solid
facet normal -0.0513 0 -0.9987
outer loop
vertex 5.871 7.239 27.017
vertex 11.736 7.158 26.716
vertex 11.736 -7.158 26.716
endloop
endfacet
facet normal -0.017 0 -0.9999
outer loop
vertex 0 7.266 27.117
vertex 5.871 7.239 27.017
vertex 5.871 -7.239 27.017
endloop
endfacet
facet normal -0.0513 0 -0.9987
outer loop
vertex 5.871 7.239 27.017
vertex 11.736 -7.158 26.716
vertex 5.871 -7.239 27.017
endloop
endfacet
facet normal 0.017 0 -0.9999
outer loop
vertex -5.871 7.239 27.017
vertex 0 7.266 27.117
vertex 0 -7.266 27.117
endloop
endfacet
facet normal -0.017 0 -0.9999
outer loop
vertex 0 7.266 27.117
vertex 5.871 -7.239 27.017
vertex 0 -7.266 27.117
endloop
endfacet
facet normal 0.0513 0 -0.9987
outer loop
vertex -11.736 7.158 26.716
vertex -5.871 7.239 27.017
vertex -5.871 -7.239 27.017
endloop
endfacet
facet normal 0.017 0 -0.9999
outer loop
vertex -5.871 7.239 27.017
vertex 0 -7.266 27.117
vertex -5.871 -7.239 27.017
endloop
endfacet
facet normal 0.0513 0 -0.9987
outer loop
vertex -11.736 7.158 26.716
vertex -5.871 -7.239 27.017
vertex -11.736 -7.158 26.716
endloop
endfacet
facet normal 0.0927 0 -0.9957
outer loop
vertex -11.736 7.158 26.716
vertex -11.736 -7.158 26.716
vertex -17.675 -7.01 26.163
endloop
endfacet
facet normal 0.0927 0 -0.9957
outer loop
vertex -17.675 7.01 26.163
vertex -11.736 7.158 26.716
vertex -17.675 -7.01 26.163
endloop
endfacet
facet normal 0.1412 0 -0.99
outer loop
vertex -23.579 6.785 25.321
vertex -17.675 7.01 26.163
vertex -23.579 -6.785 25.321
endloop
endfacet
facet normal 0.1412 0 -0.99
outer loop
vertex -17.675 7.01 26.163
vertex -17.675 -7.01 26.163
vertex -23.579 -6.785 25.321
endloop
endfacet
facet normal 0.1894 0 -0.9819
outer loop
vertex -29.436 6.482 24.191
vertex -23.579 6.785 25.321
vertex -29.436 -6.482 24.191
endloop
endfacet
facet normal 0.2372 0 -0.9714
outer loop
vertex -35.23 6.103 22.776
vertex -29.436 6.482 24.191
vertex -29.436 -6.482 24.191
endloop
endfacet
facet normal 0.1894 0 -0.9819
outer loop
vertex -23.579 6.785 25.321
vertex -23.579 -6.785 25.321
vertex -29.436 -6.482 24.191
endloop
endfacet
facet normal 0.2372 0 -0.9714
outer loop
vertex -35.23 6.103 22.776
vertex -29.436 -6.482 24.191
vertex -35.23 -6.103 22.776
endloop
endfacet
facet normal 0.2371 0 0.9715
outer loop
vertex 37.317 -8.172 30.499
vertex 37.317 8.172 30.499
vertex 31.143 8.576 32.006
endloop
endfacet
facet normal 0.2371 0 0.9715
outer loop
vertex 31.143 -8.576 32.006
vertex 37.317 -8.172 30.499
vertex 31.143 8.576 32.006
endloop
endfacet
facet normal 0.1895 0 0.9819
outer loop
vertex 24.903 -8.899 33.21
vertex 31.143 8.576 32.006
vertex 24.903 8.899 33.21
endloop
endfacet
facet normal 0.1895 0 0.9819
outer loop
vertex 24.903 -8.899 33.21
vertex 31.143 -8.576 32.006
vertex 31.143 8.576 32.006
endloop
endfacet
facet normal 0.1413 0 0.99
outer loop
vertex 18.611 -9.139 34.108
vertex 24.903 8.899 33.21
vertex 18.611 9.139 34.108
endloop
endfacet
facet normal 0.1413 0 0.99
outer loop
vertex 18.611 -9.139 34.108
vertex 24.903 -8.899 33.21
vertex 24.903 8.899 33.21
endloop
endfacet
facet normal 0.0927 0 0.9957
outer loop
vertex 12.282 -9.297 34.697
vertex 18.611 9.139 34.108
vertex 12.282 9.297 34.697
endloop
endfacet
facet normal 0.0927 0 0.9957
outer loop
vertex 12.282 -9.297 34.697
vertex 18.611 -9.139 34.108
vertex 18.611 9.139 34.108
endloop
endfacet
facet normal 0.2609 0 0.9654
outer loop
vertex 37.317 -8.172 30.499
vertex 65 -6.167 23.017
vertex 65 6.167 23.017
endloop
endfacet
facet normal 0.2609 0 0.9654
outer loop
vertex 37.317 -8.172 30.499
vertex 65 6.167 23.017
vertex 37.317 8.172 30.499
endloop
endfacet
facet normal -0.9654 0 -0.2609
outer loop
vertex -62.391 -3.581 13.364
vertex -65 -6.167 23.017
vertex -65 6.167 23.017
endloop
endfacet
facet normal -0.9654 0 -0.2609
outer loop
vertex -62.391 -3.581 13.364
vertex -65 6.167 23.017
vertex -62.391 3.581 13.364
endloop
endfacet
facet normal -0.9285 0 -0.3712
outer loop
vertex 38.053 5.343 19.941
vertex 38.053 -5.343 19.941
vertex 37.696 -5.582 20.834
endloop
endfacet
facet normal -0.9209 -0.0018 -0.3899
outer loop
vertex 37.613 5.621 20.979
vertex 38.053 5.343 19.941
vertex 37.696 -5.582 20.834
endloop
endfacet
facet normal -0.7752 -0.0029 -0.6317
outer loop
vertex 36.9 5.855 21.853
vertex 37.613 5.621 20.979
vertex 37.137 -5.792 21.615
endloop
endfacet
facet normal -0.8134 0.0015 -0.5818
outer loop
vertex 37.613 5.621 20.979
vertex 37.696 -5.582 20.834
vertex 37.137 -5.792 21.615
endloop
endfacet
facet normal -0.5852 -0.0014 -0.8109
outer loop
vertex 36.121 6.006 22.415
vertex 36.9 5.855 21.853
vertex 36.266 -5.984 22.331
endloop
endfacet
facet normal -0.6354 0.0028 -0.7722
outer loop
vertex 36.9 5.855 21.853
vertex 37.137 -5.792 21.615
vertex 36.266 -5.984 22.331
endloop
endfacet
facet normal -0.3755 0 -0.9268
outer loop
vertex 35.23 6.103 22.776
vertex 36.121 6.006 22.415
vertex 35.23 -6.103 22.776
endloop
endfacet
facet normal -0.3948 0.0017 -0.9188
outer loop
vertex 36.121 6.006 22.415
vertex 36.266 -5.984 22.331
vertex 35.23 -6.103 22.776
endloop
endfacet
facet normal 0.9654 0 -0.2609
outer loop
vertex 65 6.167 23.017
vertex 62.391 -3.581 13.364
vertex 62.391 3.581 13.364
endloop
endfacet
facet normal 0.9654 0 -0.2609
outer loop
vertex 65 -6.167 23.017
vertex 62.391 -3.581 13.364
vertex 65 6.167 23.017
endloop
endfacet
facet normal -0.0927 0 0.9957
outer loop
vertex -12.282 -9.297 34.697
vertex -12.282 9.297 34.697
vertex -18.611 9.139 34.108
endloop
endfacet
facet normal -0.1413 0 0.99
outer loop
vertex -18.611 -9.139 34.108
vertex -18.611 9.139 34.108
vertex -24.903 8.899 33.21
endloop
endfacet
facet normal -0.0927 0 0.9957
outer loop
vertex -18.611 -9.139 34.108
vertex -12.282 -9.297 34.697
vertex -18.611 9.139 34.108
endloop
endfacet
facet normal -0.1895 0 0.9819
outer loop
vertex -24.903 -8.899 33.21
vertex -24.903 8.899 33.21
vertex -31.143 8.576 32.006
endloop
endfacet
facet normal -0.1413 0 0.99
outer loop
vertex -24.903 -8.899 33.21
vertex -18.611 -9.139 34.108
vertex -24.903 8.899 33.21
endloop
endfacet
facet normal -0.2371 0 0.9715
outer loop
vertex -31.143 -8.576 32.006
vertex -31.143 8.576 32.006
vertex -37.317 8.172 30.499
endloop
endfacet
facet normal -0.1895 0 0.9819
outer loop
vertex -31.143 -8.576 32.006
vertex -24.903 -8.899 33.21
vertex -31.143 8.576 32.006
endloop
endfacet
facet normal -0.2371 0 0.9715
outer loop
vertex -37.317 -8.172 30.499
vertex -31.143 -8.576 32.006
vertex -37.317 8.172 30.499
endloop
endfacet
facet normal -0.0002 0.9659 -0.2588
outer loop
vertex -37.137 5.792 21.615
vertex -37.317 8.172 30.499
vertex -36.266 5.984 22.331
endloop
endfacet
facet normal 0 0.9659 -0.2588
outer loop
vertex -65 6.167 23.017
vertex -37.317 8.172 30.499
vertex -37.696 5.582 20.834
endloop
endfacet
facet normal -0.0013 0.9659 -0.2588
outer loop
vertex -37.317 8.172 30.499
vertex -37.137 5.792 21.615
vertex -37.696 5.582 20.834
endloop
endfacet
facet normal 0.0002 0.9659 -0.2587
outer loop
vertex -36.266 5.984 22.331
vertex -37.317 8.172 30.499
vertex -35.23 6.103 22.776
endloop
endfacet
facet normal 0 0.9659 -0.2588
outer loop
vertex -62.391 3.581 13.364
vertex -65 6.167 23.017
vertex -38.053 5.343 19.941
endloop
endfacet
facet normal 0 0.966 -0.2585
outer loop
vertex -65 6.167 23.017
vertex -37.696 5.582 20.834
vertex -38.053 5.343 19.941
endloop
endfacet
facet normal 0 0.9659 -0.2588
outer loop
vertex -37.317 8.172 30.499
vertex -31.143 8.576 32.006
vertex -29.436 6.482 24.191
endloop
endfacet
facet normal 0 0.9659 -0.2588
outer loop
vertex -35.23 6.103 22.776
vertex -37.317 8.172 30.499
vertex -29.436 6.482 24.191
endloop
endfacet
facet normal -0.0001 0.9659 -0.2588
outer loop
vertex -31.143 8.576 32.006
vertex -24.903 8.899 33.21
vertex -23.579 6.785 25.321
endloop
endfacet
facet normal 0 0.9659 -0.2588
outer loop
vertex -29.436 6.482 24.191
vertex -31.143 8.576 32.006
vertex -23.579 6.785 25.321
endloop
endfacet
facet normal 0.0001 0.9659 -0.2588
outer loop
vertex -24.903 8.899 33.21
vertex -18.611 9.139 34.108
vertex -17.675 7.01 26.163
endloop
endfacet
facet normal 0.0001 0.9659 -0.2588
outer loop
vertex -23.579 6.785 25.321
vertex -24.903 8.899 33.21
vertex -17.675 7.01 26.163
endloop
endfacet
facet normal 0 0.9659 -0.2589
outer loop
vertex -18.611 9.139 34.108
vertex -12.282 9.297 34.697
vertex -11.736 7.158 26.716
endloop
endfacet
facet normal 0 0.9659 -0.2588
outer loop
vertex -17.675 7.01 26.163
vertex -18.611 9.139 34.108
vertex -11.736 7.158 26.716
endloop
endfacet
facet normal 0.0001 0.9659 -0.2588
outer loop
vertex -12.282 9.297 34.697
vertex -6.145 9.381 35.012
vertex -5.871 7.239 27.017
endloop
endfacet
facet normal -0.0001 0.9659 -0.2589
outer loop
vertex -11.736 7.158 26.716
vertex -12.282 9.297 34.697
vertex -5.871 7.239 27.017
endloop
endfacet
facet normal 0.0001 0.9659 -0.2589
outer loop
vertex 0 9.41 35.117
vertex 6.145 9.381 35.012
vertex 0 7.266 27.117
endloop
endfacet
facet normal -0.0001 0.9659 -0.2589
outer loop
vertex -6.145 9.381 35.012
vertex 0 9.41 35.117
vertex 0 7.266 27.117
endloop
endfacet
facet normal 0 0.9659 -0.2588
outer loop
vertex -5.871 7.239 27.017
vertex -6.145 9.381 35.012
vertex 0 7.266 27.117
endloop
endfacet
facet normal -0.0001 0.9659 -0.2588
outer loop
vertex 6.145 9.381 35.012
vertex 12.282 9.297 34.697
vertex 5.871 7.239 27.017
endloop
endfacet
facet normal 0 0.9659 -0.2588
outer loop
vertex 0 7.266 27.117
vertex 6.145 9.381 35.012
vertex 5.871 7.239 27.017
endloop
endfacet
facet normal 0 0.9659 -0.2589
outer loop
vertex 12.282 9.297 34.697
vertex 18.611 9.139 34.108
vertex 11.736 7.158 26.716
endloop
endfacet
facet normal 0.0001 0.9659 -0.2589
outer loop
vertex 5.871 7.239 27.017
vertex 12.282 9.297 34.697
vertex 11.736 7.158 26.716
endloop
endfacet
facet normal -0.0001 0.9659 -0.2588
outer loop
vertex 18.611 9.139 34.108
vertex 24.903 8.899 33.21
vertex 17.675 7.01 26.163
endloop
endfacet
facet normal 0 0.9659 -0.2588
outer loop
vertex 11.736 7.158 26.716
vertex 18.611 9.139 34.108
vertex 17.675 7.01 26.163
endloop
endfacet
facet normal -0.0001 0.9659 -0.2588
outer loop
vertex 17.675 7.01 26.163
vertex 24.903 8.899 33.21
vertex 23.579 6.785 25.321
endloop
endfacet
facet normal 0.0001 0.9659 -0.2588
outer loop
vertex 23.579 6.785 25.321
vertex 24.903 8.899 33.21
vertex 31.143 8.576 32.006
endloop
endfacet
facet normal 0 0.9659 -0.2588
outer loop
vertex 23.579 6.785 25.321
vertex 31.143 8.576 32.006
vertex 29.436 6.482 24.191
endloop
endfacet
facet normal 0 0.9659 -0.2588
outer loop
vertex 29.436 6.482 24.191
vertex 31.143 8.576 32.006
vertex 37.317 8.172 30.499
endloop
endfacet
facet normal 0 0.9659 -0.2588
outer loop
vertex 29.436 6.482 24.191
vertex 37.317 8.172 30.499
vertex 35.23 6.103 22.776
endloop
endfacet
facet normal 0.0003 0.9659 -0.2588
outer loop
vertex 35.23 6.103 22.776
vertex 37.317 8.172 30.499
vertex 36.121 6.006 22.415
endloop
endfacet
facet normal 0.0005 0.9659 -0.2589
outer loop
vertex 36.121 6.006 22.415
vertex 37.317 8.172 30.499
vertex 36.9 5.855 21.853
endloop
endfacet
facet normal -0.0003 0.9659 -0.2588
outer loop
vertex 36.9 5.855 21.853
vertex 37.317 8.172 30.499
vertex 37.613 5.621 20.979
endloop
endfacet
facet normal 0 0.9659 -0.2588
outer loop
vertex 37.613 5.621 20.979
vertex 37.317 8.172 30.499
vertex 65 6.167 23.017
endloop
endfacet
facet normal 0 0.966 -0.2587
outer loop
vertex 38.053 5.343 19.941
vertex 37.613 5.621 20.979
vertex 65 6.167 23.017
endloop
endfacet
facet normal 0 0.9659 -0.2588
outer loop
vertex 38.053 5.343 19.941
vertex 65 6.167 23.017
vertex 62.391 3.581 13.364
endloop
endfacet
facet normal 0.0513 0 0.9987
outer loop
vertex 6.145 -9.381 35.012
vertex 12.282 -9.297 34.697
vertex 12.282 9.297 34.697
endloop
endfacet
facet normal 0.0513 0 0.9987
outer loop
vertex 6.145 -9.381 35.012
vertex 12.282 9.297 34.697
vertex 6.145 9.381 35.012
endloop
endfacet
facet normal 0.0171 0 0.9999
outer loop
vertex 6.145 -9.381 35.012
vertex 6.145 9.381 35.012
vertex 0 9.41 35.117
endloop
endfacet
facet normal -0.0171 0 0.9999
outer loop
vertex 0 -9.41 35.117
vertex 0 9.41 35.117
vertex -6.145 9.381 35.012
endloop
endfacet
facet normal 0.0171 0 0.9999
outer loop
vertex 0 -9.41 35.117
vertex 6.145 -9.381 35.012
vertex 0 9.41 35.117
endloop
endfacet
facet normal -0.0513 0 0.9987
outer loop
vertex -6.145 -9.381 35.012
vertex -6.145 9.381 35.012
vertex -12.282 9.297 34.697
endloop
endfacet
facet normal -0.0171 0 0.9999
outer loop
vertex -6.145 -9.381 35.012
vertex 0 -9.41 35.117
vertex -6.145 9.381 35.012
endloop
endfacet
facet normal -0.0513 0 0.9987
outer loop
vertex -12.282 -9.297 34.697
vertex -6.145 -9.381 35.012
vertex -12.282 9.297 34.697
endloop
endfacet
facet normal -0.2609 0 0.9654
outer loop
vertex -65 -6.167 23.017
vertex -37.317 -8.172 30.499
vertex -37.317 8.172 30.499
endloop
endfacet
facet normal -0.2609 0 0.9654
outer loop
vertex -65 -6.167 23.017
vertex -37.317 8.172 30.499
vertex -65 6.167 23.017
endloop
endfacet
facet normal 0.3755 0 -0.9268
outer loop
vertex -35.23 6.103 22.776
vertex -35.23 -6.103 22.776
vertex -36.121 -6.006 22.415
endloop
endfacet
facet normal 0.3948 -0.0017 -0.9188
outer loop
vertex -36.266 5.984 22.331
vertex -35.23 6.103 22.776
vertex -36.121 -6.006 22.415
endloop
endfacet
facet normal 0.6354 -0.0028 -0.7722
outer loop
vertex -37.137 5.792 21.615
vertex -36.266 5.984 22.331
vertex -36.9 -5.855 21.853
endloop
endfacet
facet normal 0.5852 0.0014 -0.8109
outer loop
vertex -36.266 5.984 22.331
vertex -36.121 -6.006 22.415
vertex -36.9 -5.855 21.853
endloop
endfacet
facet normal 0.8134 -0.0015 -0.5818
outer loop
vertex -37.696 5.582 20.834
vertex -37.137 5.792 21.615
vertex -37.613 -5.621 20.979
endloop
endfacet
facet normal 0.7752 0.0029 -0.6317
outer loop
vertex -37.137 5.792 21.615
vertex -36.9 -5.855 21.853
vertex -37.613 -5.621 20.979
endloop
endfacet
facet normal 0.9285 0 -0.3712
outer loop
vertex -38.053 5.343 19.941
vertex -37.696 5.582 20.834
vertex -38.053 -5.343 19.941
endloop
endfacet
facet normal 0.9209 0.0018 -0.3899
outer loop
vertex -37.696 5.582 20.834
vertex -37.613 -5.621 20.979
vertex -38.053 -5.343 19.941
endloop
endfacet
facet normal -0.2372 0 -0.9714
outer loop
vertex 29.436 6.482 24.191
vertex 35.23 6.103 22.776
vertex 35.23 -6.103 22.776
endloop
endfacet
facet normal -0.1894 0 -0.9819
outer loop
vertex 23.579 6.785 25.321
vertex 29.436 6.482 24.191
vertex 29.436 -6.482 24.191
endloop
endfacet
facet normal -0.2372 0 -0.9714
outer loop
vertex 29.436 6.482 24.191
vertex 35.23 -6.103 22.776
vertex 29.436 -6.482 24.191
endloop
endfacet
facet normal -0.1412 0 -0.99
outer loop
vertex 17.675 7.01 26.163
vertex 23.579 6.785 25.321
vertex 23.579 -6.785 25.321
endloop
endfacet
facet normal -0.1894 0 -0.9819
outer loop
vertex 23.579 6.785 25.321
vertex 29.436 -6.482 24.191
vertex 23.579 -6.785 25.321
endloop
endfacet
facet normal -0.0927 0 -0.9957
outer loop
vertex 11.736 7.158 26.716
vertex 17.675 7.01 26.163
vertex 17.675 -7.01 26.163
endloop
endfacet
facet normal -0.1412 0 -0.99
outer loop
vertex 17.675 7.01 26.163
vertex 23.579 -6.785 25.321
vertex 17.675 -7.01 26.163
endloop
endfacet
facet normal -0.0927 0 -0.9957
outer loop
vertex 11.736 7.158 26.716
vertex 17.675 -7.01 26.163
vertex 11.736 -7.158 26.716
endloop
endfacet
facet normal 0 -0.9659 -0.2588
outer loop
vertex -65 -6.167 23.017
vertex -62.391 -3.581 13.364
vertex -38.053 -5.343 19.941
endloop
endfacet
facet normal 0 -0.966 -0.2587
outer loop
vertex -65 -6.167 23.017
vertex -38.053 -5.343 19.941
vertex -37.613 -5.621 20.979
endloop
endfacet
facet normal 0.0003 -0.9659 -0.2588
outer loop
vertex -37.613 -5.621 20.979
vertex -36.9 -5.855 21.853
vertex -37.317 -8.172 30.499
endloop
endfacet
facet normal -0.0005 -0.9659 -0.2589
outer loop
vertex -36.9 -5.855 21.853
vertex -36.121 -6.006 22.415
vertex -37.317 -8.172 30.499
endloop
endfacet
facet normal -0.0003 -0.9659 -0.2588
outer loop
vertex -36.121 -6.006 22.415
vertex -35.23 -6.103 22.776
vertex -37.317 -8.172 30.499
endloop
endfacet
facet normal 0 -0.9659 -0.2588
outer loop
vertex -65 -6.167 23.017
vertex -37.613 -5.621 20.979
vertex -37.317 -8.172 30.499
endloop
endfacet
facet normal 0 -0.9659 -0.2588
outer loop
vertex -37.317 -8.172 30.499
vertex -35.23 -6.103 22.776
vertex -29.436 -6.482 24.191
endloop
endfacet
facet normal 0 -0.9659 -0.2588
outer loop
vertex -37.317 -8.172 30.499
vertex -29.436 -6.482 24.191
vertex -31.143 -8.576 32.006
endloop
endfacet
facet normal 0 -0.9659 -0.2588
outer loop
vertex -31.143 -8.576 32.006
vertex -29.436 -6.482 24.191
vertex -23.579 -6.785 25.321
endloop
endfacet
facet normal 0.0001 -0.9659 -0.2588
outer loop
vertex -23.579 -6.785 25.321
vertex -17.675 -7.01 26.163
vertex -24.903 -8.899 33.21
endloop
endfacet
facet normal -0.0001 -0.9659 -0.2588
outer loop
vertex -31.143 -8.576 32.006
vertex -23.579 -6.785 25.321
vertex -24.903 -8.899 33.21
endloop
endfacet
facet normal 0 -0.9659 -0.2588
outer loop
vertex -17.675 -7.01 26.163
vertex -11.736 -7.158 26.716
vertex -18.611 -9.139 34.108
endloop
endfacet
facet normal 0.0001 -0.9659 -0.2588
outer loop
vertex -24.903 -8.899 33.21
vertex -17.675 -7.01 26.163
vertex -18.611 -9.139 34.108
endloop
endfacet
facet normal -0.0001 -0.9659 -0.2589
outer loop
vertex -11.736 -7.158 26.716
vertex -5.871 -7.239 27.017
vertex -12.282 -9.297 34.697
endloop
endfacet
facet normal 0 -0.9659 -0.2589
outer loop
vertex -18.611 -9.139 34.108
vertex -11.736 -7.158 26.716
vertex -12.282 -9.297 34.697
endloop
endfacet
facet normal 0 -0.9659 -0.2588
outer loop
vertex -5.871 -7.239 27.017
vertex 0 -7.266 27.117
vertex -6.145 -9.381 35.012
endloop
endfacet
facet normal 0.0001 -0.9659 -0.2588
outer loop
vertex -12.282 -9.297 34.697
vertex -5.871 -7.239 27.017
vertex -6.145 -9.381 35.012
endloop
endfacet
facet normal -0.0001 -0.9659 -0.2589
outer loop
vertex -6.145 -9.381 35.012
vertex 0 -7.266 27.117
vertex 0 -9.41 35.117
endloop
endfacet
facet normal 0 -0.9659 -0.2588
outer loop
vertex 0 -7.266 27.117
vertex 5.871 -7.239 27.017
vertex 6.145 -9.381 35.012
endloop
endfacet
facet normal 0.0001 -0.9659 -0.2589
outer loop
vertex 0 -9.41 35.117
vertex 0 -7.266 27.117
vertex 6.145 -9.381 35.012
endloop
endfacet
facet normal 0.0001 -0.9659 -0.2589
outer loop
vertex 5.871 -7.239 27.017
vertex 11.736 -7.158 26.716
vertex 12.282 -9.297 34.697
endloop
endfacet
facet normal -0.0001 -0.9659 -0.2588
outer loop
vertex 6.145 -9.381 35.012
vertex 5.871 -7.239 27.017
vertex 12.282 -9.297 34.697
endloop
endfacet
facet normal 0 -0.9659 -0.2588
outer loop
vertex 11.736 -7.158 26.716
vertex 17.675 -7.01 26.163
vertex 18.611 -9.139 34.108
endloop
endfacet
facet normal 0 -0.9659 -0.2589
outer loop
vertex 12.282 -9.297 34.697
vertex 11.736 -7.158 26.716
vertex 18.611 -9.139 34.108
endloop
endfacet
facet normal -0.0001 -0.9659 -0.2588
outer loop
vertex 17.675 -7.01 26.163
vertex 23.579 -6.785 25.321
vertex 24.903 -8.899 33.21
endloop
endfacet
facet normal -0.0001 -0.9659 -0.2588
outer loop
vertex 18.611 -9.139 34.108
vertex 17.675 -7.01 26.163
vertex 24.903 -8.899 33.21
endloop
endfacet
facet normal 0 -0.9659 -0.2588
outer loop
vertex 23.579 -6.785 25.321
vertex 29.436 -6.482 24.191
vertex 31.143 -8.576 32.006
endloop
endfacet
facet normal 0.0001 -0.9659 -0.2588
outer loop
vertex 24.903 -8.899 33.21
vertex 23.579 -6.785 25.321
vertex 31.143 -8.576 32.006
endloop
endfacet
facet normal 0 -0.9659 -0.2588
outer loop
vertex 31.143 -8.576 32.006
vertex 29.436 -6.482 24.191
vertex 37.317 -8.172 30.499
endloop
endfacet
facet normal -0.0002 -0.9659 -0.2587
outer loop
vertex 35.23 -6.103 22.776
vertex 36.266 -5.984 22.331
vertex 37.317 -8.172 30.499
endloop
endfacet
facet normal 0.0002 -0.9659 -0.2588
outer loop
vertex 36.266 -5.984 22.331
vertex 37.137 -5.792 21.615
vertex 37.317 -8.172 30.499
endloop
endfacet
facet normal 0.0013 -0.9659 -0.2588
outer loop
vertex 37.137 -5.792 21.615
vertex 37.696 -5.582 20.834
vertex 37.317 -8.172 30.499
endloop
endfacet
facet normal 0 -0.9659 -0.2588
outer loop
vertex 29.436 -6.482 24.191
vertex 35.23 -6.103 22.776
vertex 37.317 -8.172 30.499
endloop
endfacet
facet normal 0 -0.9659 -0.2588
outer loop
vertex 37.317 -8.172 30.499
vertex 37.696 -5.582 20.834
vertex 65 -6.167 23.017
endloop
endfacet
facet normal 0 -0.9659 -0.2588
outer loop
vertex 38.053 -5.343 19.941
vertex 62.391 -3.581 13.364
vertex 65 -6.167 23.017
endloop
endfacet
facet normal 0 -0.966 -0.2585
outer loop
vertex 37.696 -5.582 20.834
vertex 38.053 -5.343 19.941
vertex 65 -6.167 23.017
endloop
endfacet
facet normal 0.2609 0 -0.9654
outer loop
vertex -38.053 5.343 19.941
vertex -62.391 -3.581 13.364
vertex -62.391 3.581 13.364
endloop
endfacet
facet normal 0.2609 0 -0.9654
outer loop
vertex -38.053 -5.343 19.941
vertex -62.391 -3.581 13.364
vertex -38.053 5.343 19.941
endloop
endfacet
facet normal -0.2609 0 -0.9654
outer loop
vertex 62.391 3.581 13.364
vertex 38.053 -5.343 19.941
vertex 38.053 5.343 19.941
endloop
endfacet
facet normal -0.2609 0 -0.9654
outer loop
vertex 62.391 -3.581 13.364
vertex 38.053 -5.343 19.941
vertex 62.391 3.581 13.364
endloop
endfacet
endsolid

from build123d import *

# Parameters (mm, degrees)
F1_DEPTH = 15
F3_DEPTH = 100
F5_DEPTH = 12.5


with BuildPart() as f1:
    # F0 (on Front) → F1 (new body, symmetric)
    with BuildSketch(Plane.XZ):
        with BuildLine():
            ThreePointArc((37.317329624, 30.4986087275), (24.902598062, 33.210330732), (12.2824249303, 34.6970136545))
            ThreePointArc((12.2824249303, 34.6970136545), (0, 35.1170361544), (-12.2824249303, 34.6970136545))
            ThreePointArc((-12.2824249303, 34.6970136545), (-24.902598062, 33.210330732), (-37.317329624, 30.4986087275))
            Line((-37.317329624, 30.4986087275), (-65, 23.01738))
            Line((-65, 23.01738), (-62.3910963169, 13.3636956478))
            Line((-62.3910963169, 13.3636956478), (-34.7084259409, 20.8449243753))
            ThreePointArc((-34.7084259409, 20.8449243753), (-23.2486737298, 23.3480523794), (-11.5992831467, 24.7203750772))
            ThreePointArc((-11.5992831467, 24.7203750772), (0, 25.1170361544), (11.5992831467, 24.7203750772))
            ThreePointArc((11.5992831467, 24.7203750772), (23.2486737298, 23.3480523794), (34.7084259409, 20.8449243753))
            Line((34.7084259409, 20.8449243753), (62.3910963169, 13.3636956478))
            Line((62.3910963169, 13.3636956478), (65, 23.01738))
            Line((65, 23.01738), (37.317329624, 30.4986087275))
        make_face()
    extrude(amount=F1_DEPTH, both=True)

    # F2 (on Right) → F3 (cut, symmetric)
    with BuildSketch(Plane.YZ):
        Polygon((-1.875644347, 7), (-17, 63.4448637287), (-17, 0), (0, 0), (17, 0), (17, 63.4448637287), (1.875644347, 7), align=None)
    extrude(amount=F3_DEPTH, both=True, mode=Mode.SUBTRACT)

    # F4 (on Front) → F5 (cut, symmetric)
    with BuildSketch(Plane.XZ):
        with BuildLine():
            ThreePointArc((11.7359115034, 26.7157027926), (0, 27.1170361544), (-11.7359115034, 26.7157027926))
            ThreePointArc((-11.7359115034, 26.7157027926), (-23.5794585962, 25.32050805), (-35.2302066775, 22.7756612458))
            ThreePointArc((-35.2302066775, 22.7756612458), (-37.021132821, 21.7365411239), (-38.0525602966, 19.9411736291))
            Line((-38.0525602966, 19.9411736291), (-34.7084259409, 20.8449243753))
            ThreePointArc((-34.7084259409, 20.8449243753), (-23.2486737298, 23.3480523794), (-11.5992831467, 24.7203750772))
            ThreePointArc((-11.5992831467, 24.7203750772), (0, 25.1170361544), (11.5992831467, 24.7203750772))
            ThreePointArc((11.5992831467, 24.7203750772), (23.2486737298, 23.3480523794), (34.7084259409, 20.8449243753))
            Line((34.7084259409, 20.8449243753), (38.0525602966, 19.9411736291))
            ThreePointArc((38.0525602966, 19.9411736291), (37.021132821, 21.7365411239), (35.2302066775, 22.7756612458))
            ThreePointArc((35.2302066775, 22.7756612458), (23.5794585962, 25.32050805), (11.7359115034, 26.7157027927))
        make_face()
    extrude(amount=F5_DEPTH, both=True, mode=Mode.SUBTRACT)


solid = f1.part
